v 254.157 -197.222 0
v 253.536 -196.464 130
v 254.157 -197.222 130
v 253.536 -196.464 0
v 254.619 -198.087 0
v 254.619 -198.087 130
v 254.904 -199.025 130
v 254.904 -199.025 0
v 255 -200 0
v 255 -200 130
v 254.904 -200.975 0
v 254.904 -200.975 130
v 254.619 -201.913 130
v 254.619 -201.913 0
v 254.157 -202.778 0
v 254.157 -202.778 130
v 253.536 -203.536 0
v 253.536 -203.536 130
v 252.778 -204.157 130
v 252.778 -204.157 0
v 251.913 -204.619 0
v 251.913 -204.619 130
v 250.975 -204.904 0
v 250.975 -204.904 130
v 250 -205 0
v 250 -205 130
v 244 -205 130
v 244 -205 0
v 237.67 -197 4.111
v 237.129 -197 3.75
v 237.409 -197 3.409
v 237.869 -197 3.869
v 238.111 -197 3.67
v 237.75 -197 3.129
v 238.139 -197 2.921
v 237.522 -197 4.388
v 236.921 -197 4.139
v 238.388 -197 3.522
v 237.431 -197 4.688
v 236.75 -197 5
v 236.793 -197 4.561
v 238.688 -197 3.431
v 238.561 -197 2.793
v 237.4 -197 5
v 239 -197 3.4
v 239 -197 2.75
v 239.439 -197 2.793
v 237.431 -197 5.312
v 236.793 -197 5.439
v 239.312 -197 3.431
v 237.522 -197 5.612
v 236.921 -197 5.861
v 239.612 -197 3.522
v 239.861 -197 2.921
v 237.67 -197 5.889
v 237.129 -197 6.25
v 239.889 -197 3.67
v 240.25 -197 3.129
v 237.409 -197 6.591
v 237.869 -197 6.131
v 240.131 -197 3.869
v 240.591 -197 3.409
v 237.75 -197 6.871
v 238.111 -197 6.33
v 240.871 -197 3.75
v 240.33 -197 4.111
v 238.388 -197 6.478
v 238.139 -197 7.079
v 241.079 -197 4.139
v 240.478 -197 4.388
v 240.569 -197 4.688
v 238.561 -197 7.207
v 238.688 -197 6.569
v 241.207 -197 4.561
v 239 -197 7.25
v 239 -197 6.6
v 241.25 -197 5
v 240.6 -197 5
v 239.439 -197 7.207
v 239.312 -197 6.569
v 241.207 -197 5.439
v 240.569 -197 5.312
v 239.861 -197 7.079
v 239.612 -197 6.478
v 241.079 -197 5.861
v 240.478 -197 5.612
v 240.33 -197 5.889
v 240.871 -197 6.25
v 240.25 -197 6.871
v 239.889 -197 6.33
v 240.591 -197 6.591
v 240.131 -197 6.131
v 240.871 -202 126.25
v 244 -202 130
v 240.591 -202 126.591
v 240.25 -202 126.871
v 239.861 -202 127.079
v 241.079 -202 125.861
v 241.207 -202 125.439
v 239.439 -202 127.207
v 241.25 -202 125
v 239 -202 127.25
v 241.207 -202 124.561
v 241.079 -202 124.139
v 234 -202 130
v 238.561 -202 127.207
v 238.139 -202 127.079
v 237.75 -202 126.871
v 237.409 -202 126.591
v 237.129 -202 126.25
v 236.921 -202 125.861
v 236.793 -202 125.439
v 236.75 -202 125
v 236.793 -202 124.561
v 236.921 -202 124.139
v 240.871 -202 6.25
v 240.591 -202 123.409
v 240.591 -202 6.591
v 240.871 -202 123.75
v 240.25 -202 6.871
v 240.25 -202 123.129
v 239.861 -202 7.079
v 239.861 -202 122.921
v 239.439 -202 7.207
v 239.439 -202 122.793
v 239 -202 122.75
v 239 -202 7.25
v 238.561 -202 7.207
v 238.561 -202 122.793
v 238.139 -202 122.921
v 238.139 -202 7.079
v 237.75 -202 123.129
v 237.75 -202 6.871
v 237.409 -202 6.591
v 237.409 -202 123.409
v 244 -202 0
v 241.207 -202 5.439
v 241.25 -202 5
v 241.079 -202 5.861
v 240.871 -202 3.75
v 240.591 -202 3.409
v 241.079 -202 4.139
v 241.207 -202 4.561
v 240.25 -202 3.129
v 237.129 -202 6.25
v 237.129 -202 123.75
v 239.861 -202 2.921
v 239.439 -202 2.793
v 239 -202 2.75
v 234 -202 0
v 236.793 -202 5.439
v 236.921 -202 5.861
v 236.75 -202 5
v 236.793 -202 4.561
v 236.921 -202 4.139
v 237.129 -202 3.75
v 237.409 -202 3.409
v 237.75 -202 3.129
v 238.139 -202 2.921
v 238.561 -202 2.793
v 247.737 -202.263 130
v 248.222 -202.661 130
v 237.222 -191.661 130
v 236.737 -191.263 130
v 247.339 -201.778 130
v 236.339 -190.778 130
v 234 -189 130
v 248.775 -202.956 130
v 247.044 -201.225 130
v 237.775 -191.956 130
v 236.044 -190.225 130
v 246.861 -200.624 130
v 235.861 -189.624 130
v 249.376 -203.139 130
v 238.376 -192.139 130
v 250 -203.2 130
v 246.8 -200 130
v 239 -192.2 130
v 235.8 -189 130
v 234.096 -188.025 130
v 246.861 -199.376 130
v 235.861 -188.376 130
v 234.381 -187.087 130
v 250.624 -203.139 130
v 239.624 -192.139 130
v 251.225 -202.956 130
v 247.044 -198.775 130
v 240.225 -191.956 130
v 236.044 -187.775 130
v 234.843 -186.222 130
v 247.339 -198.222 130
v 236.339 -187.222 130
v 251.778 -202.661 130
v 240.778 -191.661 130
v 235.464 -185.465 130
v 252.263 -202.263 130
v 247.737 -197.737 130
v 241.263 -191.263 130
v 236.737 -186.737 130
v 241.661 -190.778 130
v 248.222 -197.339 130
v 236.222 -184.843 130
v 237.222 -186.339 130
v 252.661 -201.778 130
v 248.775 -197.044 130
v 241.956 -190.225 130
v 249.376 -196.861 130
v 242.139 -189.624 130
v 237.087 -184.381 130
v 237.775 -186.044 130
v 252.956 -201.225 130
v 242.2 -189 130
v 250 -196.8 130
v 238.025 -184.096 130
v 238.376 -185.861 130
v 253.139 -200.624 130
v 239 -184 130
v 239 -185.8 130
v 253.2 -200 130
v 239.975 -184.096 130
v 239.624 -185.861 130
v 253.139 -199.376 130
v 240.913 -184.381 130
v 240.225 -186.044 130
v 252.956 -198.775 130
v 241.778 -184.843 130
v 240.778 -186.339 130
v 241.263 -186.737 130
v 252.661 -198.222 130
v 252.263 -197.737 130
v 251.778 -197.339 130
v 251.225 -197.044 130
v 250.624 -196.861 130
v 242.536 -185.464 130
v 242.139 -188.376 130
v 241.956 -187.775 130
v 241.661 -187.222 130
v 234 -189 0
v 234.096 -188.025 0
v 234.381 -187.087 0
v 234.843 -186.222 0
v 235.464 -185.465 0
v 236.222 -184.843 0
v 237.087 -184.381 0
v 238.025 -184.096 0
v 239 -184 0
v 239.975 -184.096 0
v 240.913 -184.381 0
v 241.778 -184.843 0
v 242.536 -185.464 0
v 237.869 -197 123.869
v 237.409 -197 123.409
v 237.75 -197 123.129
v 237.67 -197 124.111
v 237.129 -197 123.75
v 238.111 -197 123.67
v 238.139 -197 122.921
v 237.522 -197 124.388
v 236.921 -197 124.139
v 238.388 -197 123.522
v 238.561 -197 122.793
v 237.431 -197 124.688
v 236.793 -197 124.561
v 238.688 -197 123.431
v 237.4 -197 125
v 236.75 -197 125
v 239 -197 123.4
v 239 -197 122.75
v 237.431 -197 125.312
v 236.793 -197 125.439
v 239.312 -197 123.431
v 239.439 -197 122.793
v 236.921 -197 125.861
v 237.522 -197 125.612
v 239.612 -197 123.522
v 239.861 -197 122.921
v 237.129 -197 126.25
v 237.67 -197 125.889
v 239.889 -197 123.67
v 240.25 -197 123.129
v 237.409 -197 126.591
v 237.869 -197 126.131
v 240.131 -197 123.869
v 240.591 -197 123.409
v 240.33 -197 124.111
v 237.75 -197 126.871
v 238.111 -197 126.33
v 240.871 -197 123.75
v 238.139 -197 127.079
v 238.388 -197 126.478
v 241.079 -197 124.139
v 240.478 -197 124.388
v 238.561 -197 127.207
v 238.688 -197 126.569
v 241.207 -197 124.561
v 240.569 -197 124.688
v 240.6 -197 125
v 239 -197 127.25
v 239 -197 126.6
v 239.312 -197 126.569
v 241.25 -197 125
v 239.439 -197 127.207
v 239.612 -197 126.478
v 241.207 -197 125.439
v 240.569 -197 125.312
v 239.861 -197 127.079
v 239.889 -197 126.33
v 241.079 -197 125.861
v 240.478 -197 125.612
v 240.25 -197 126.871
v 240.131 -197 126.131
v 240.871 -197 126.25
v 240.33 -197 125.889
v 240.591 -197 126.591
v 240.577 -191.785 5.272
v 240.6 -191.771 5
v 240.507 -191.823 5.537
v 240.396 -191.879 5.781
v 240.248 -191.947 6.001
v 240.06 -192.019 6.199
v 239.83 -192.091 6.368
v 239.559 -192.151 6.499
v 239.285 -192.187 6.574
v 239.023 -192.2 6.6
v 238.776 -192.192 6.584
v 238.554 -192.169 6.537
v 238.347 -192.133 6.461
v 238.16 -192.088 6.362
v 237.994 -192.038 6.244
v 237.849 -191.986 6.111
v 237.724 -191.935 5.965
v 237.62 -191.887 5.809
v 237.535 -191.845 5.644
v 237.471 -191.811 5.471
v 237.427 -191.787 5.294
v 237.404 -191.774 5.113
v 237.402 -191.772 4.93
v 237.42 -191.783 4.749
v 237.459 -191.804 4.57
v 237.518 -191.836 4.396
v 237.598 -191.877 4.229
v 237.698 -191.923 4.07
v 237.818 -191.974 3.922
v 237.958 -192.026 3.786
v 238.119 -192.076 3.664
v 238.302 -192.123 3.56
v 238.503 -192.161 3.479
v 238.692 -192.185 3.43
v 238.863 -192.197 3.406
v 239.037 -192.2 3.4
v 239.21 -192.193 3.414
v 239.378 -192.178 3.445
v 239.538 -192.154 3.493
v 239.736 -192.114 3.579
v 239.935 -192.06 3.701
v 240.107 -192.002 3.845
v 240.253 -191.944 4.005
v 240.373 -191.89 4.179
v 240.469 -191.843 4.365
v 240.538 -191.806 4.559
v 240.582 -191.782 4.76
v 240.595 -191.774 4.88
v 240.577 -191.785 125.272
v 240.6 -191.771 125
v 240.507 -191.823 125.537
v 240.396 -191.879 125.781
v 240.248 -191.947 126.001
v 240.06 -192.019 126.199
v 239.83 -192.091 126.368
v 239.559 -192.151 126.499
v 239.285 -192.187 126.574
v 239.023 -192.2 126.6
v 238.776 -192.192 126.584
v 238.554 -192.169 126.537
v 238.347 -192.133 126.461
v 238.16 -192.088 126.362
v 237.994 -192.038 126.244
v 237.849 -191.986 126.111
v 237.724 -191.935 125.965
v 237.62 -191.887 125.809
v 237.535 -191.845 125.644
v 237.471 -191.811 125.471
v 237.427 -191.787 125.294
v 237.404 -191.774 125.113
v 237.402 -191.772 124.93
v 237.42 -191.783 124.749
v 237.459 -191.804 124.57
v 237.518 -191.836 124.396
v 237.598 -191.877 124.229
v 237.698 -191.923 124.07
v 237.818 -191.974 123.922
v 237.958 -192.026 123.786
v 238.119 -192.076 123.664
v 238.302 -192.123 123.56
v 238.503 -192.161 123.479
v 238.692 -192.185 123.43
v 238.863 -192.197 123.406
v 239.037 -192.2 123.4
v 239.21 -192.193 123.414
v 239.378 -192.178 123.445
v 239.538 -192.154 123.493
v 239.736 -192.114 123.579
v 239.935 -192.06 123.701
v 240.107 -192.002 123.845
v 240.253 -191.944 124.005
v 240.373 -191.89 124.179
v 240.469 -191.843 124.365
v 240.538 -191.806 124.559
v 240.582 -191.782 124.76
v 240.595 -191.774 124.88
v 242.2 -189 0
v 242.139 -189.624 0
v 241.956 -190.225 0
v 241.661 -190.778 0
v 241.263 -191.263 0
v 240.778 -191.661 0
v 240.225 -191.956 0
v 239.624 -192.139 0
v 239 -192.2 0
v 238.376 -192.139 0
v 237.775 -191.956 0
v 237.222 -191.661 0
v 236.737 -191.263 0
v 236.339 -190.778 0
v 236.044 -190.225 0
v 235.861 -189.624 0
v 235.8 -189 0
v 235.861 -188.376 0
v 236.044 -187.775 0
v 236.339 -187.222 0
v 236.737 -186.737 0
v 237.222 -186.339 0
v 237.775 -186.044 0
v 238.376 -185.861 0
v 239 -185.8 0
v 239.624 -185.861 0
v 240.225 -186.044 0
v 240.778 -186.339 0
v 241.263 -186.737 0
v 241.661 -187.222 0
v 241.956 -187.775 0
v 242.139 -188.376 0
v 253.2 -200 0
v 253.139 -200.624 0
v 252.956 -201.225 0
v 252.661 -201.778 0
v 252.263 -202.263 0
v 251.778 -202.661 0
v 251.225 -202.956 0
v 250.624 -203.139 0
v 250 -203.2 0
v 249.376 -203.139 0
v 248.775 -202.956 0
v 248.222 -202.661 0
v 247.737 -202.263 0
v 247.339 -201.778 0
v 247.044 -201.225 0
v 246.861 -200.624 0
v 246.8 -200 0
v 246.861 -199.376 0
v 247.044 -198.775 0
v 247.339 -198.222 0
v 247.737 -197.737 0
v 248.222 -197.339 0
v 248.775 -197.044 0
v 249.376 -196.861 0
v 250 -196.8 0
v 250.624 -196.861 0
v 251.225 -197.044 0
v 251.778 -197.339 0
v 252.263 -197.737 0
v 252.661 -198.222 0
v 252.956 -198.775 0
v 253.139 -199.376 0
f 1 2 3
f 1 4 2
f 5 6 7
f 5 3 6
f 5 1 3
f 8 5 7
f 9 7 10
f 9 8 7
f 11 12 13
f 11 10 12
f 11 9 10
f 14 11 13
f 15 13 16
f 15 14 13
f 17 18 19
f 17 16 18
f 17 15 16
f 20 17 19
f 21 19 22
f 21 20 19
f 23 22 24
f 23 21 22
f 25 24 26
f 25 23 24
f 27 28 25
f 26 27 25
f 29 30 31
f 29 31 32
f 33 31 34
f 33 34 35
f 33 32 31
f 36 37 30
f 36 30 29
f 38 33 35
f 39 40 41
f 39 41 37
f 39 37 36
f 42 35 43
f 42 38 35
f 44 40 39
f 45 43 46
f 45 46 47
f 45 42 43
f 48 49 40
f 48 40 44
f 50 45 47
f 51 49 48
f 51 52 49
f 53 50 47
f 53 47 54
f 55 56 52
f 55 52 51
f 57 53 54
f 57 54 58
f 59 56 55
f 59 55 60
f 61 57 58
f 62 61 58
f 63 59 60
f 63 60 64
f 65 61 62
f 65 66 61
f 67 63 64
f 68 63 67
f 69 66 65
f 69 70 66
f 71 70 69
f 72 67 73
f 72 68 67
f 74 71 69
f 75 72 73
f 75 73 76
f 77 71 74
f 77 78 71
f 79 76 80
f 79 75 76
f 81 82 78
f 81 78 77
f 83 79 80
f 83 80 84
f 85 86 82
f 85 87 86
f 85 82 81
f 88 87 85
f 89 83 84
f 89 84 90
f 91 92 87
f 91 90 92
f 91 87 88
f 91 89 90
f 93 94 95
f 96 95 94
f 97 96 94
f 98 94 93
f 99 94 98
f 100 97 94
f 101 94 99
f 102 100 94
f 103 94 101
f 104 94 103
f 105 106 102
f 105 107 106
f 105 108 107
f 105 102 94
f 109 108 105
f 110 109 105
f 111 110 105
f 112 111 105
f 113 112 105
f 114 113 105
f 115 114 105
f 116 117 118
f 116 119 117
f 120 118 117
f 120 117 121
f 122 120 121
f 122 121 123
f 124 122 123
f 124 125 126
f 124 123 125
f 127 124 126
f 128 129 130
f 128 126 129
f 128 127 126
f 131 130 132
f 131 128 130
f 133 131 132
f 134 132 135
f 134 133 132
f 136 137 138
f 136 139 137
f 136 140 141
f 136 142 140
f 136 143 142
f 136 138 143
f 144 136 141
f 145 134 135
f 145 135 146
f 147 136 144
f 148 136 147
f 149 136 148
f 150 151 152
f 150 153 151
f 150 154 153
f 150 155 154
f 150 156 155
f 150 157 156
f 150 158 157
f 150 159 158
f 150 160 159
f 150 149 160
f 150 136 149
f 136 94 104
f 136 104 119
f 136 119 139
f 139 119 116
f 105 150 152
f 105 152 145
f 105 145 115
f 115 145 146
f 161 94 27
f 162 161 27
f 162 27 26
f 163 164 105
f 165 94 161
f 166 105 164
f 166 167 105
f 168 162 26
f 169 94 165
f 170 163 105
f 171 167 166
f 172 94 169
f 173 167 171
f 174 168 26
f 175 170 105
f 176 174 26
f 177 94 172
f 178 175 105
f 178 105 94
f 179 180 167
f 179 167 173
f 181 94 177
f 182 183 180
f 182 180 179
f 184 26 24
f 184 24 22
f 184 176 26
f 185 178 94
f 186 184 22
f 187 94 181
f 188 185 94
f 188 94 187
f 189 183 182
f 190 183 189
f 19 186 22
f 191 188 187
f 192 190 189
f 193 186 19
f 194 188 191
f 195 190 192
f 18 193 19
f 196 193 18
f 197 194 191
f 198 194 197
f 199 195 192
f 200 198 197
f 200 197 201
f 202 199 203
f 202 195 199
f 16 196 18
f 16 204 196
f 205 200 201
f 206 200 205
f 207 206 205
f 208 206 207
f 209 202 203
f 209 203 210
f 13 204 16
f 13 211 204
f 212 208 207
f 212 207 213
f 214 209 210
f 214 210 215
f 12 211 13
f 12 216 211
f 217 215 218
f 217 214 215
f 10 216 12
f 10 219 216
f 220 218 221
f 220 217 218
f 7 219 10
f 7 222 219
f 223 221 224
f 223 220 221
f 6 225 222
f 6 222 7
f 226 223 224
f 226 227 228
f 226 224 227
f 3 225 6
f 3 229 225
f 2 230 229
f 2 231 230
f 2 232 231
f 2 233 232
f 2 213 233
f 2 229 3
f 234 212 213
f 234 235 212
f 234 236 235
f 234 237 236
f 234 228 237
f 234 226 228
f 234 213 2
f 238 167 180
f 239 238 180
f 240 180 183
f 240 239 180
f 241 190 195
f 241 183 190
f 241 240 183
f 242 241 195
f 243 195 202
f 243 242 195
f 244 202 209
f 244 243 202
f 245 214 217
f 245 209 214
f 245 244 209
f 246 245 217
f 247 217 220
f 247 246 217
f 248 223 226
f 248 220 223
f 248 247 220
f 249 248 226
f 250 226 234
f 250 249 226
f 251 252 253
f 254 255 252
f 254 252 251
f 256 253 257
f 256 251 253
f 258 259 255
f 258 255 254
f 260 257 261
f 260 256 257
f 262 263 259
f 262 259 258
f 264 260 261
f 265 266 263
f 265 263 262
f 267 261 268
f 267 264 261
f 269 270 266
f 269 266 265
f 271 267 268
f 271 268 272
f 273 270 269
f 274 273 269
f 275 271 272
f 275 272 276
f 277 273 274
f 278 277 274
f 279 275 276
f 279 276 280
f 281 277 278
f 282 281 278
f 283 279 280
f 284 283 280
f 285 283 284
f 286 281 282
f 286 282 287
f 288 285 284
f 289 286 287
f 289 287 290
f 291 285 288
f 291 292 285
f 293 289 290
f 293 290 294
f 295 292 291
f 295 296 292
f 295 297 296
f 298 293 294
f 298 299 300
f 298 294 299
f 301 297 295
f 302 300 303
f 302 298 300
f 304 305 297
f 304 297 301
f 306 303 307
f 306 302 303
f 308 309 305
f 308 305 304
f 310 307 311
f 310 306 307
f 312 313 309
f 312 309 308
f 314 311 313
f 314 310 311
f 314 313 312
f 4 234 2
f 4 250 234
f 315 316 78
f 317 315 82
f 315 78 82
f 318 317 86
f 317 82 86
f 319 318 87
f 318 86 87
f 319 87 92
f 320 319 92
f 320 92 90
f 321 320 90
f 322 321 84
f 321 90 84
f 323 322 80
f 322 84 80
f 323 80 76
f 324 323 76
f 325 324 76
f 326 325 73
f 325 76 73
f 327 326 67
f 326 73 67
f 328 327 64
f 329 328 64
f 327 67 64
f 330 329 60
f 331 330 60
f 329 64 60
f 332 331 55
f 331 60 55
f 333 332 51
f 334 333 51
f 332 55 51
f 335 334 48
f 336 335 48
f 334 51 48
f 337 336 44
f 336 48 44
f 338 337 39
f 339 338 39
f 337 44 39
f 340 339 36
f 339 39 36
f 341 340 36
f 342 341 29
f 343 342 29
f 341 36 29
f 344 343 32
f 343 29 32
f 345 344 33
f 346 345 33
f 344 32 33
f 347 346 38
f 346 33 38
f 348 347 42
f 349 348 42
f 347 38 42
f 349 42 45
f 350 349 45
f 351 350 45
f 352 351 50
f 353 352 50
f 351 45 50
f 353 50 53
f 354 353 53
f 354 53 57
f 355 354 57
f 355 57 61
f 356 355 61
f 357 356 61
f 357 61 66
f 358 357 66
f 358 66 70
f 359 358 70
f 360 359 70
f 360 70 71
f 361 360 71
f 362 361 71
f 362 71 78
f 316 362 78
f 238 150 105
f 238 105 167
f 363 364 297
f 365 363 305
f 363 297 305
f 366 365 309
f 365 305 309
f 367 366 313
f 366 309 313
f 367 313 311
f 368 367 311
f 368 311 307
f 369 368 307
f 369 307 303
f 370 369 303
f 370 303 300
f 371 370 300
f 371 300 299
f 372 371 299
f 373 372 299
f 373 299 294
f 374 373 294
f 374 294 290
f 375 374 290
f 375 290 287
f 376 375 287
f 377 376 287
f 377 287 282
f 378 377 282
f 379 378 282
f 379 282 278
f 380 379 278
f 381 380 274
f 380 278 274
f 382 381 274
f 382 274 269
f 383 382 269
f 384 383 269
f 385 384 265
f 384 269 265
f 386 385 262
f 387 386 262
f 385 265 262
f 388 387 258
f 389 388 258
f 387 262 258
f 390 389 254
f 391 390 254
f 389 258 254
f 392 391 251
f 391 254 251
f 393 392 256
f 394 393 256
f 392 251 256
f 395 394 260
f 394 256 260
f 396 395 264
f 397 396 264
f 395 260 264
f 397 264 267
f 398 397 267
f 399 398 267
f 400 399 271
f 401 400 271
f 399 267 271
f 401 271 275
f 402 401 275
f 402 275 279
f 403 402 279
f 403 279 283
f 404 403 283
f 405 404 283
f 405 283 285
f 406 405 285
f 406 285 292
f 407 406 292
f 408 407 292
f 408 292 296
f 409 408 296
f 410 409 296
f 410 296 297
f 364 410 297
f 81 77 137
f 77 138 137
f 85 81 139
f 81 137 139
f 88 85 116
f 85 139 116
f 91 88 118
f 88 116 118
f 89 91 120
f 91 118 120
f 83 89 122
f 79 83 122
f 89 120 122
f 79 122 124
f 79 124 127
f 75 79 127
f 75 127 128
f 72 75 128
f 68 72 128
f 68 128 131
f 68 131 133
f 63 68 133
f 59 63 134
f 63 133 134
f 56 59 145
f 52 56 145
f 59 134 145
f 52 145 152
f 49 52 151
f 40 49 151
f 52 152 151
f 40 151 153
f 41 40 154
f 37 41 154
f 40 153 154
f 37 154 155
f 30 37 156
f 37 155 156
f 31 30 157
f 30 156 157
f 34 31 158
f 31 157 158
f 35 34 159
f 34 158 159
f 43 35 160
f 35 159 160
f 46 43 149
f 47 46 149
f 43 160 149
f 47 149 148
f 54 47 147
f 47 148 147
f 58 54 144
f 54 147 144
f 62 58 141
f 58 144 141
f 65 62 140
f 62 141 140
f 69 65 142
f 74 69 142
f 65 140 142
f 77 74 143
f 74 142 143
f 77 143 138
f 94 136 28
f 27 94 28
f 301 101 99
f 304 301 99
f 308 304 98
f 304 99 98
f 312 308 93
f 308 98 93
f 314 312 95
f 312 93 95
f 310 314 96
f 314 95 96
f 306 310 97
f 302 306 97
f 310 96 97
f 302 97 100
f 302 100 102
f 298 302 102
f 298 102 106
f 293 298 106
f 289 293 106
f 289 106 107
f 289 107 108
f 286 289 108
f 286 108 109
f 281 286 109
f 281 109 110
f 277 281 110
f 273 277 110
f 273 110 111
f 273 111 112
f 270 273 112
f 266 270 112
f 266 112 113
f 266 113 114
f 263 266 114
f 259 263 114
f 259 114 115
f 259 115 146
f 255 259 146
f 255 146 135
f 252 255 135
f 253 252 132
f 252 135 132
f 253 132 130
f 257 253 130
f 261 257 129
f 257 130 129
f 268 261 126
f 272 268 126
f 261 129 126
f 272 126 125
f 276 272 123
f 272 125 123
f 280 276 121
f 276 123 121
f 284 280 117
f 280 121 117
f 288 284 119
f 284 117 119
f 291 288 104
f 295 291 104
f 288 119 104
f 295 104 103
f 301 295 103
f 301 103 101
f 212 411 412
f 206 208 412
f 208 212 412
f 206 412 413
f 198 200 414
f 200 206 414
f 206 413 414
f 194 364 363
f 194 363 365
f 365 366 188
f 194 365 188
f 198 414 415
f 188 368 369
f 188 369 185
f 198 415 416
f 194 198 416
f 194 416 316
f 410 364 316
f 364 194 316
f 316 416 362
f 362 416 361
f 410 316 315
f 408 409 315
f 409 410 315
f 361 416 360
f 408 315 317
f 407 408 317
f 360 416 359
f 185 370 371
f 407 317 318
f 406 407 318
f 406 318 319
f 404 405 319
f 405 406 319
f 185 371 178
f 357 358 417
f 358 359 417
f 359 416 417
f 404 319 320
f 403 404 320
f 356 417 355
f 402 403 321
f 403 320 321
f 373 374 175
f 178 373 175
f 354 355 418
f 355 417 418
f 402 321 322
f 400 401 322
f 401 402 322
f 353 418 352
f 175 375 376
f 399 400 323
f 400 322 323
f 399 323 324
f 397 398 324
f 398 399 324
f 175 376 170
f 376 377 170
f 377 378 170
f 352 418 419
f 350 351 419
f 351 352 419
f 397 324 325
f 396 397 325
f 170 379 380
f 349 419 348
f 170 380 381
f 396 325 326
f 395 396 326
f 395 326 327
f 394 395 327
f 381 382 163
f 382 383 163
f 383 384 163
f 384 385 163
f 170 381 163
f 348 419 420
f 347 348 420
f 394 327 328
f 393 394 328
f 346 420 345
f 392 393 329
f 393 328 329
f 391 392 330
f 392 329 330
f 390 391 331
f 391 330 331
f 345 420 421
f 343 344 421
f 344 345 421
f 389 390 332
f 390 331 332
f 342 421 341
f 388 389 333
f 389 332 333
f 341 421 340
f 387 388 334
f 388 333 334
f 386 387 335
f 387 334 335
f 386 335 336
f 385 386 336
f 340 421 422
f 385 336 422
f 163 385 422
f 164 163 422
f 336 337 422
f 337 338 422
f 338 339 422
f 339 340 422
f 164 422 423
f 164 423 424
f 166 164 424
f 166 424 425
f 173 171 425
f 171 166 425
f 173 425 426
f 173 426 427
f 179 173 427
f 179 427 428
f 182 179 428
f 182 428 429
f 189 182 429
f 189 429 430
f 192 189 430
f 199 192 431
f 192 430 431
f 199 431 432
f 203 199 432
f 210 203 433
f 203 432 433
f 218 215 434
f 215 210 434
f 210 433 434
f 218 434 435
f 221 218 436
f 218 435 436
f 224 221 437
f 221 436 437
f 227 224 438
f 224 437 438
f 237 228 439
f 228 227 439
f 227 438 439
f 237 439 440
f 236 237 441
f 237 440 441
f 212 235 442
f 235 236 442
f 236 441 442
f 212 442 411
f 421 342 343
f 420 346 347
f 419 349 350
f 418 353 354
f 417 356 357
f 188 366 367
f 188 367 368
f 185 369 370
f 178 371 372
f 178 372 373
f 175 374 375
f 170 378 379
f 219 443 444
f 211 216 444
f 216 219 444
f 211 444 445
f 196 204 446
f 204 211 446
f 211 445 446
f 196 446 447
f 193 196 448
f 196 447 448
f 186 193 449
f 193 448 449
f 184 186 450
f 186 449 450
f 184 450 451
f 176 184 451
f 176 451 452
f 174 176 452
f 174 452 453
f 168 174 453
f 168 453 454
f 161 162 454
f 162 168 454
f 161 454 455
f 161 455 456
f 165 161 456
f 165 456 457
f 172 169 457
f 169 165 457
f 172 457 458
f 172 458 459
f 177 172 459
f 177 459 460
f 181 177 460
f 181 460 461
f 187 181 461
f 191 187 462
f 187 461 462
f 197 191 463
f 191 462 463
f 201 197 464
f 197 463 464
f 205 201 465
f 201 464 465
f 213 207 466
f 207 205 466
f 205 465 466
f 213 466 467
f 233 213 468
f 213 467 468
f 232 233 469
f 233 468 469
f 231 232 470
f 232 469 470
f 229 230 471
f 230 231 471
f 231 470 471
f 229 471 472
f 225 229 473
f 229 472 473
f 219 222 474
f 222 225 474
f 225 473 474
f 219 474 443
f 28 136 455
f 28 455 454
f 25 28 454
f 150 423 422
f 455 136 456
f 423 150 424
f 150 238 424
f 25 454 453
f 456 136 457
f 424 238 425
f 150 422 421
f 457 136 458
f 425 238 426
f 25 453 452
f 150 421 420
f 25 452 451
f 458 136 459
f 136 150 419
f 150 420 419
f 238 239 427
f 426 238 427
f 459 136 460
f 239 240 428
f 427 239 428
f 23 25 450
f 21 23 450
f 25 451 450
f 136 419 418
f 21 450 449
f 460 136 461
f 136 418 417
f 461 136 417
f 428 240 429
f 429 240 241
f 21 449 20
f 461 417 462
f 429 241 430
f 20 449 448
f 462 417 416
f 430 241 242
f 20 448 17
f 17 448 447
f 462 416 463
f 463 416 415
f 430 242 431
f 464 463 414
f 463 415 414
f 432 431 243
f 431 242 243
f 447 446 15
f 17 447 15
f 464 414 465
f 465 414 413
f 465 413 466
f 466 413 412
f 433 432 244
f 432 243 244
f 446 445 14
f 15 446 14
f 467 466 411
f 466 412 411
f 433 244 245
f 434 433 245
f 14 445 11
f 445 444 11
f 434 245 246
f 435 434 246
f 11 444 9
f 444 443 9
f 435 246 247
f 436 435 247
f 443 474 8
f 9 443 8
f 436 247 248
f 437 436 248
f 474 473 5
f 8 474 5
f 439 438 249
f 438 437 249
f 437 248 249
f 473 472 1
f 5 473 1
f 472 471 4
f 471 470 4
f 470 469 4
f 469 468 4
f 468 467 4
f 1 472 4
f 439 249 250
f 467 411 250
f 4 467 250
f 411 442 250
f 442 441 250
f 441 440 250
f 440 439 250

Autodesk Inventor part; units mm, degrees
ref_plane "YZ Plane" through (0, 0, 0) normal (1, 0, 0) x (0, 1, 0)
ref_plane "XZ Plane" through (0, 0, 0) normal (0, 1, 0) x (-1, 0, 0)
ref_plane "XY Plane" through (0, 0, 0) normal (0, 0, 1) x (1, 0, 0)
sketch "スケッチ1" plane through (0, 0, 0) normal (0, 0, 1) x (1, 0, 0)
  circle A0 centre (250, -200) radius 1.6 construction
  circle A1 centre (239, -189) radius 1.6 construction
  circle A2 centre (250, -200) radius 3.2
  circle A3 centre (239, -189) radius 3.2
  circle A4 centre (250, -200) radius 5 construction
  circle A5 centre (239, -189) radius 5 construction
  line L0 (242.5355, -185.4645) -> (253.5355, -196.4645)
  line L1 (250, -200) -> (239, -189) construction
  line L2 (-250, -205) -> (250, -205) projected
  line L3 (244, -202) -> (234, -202)
  line L4 (234, -202) -> (234, -189)
  line L5 (244, -202) -> (244, -205)
  line L6 (244, -205) -> (250, -205)
  arc A6 (250, -205) -> (253.5355, -196.4645) centre (250, -200) ccw
  arc A7 (242.5355, -185.4645) -> (234, -189) centre (239, -189) ccw
  point P0 (0, 0)
  point P1 (255, -200)
  dimension "d0" = 6.4
  dimension "d2" = 10
  dimension "d3" = 3
extrude "押し出し1" add sketch "スケッチ1" along normal blind 130
sketch "スケッチ2" plane through (234, -202, 0) normal (0, -1, 0) x (1, 0, 0)
  line L0 (1.8, 130) -> (8.2, 130) construction
  line L1 (1.8, 0) -> (8.2, 0) construction
  line L2 (5, 130) -> (5, 0) construction
  circle A0 centre (5, 125) radius 2.25
  circle A1 centre (5, 5) radius 2.25
  point P0 (-234, 0)
  dimension "d6" = 4.5
  dimension "d7" = 5
  dimension "d8" = 5
extrude "押し出し2" cut sketch "スケッチ2" against normal blind 5
sketch "スケッチ3" plane through (234, -202, 0) normal (0, -1, 0) x (1, 0, 0)
  circle A0 centre (5, 125) radius 2.25 construction
  circle A1 centre (5, 5) radius 2.25 construction
  circle A2 centre (5, 125) radius 1.6
  circle A3 centre (5, 5) radius 1.6
  point P0 (-234, 0)
  dimension "d11" = 3.2
extrude "押し出し3" cut sketch "スケッチ3" against normal blind 13
equation "\"d8\" = d7"
properties part number "radiator_adapter_01"
